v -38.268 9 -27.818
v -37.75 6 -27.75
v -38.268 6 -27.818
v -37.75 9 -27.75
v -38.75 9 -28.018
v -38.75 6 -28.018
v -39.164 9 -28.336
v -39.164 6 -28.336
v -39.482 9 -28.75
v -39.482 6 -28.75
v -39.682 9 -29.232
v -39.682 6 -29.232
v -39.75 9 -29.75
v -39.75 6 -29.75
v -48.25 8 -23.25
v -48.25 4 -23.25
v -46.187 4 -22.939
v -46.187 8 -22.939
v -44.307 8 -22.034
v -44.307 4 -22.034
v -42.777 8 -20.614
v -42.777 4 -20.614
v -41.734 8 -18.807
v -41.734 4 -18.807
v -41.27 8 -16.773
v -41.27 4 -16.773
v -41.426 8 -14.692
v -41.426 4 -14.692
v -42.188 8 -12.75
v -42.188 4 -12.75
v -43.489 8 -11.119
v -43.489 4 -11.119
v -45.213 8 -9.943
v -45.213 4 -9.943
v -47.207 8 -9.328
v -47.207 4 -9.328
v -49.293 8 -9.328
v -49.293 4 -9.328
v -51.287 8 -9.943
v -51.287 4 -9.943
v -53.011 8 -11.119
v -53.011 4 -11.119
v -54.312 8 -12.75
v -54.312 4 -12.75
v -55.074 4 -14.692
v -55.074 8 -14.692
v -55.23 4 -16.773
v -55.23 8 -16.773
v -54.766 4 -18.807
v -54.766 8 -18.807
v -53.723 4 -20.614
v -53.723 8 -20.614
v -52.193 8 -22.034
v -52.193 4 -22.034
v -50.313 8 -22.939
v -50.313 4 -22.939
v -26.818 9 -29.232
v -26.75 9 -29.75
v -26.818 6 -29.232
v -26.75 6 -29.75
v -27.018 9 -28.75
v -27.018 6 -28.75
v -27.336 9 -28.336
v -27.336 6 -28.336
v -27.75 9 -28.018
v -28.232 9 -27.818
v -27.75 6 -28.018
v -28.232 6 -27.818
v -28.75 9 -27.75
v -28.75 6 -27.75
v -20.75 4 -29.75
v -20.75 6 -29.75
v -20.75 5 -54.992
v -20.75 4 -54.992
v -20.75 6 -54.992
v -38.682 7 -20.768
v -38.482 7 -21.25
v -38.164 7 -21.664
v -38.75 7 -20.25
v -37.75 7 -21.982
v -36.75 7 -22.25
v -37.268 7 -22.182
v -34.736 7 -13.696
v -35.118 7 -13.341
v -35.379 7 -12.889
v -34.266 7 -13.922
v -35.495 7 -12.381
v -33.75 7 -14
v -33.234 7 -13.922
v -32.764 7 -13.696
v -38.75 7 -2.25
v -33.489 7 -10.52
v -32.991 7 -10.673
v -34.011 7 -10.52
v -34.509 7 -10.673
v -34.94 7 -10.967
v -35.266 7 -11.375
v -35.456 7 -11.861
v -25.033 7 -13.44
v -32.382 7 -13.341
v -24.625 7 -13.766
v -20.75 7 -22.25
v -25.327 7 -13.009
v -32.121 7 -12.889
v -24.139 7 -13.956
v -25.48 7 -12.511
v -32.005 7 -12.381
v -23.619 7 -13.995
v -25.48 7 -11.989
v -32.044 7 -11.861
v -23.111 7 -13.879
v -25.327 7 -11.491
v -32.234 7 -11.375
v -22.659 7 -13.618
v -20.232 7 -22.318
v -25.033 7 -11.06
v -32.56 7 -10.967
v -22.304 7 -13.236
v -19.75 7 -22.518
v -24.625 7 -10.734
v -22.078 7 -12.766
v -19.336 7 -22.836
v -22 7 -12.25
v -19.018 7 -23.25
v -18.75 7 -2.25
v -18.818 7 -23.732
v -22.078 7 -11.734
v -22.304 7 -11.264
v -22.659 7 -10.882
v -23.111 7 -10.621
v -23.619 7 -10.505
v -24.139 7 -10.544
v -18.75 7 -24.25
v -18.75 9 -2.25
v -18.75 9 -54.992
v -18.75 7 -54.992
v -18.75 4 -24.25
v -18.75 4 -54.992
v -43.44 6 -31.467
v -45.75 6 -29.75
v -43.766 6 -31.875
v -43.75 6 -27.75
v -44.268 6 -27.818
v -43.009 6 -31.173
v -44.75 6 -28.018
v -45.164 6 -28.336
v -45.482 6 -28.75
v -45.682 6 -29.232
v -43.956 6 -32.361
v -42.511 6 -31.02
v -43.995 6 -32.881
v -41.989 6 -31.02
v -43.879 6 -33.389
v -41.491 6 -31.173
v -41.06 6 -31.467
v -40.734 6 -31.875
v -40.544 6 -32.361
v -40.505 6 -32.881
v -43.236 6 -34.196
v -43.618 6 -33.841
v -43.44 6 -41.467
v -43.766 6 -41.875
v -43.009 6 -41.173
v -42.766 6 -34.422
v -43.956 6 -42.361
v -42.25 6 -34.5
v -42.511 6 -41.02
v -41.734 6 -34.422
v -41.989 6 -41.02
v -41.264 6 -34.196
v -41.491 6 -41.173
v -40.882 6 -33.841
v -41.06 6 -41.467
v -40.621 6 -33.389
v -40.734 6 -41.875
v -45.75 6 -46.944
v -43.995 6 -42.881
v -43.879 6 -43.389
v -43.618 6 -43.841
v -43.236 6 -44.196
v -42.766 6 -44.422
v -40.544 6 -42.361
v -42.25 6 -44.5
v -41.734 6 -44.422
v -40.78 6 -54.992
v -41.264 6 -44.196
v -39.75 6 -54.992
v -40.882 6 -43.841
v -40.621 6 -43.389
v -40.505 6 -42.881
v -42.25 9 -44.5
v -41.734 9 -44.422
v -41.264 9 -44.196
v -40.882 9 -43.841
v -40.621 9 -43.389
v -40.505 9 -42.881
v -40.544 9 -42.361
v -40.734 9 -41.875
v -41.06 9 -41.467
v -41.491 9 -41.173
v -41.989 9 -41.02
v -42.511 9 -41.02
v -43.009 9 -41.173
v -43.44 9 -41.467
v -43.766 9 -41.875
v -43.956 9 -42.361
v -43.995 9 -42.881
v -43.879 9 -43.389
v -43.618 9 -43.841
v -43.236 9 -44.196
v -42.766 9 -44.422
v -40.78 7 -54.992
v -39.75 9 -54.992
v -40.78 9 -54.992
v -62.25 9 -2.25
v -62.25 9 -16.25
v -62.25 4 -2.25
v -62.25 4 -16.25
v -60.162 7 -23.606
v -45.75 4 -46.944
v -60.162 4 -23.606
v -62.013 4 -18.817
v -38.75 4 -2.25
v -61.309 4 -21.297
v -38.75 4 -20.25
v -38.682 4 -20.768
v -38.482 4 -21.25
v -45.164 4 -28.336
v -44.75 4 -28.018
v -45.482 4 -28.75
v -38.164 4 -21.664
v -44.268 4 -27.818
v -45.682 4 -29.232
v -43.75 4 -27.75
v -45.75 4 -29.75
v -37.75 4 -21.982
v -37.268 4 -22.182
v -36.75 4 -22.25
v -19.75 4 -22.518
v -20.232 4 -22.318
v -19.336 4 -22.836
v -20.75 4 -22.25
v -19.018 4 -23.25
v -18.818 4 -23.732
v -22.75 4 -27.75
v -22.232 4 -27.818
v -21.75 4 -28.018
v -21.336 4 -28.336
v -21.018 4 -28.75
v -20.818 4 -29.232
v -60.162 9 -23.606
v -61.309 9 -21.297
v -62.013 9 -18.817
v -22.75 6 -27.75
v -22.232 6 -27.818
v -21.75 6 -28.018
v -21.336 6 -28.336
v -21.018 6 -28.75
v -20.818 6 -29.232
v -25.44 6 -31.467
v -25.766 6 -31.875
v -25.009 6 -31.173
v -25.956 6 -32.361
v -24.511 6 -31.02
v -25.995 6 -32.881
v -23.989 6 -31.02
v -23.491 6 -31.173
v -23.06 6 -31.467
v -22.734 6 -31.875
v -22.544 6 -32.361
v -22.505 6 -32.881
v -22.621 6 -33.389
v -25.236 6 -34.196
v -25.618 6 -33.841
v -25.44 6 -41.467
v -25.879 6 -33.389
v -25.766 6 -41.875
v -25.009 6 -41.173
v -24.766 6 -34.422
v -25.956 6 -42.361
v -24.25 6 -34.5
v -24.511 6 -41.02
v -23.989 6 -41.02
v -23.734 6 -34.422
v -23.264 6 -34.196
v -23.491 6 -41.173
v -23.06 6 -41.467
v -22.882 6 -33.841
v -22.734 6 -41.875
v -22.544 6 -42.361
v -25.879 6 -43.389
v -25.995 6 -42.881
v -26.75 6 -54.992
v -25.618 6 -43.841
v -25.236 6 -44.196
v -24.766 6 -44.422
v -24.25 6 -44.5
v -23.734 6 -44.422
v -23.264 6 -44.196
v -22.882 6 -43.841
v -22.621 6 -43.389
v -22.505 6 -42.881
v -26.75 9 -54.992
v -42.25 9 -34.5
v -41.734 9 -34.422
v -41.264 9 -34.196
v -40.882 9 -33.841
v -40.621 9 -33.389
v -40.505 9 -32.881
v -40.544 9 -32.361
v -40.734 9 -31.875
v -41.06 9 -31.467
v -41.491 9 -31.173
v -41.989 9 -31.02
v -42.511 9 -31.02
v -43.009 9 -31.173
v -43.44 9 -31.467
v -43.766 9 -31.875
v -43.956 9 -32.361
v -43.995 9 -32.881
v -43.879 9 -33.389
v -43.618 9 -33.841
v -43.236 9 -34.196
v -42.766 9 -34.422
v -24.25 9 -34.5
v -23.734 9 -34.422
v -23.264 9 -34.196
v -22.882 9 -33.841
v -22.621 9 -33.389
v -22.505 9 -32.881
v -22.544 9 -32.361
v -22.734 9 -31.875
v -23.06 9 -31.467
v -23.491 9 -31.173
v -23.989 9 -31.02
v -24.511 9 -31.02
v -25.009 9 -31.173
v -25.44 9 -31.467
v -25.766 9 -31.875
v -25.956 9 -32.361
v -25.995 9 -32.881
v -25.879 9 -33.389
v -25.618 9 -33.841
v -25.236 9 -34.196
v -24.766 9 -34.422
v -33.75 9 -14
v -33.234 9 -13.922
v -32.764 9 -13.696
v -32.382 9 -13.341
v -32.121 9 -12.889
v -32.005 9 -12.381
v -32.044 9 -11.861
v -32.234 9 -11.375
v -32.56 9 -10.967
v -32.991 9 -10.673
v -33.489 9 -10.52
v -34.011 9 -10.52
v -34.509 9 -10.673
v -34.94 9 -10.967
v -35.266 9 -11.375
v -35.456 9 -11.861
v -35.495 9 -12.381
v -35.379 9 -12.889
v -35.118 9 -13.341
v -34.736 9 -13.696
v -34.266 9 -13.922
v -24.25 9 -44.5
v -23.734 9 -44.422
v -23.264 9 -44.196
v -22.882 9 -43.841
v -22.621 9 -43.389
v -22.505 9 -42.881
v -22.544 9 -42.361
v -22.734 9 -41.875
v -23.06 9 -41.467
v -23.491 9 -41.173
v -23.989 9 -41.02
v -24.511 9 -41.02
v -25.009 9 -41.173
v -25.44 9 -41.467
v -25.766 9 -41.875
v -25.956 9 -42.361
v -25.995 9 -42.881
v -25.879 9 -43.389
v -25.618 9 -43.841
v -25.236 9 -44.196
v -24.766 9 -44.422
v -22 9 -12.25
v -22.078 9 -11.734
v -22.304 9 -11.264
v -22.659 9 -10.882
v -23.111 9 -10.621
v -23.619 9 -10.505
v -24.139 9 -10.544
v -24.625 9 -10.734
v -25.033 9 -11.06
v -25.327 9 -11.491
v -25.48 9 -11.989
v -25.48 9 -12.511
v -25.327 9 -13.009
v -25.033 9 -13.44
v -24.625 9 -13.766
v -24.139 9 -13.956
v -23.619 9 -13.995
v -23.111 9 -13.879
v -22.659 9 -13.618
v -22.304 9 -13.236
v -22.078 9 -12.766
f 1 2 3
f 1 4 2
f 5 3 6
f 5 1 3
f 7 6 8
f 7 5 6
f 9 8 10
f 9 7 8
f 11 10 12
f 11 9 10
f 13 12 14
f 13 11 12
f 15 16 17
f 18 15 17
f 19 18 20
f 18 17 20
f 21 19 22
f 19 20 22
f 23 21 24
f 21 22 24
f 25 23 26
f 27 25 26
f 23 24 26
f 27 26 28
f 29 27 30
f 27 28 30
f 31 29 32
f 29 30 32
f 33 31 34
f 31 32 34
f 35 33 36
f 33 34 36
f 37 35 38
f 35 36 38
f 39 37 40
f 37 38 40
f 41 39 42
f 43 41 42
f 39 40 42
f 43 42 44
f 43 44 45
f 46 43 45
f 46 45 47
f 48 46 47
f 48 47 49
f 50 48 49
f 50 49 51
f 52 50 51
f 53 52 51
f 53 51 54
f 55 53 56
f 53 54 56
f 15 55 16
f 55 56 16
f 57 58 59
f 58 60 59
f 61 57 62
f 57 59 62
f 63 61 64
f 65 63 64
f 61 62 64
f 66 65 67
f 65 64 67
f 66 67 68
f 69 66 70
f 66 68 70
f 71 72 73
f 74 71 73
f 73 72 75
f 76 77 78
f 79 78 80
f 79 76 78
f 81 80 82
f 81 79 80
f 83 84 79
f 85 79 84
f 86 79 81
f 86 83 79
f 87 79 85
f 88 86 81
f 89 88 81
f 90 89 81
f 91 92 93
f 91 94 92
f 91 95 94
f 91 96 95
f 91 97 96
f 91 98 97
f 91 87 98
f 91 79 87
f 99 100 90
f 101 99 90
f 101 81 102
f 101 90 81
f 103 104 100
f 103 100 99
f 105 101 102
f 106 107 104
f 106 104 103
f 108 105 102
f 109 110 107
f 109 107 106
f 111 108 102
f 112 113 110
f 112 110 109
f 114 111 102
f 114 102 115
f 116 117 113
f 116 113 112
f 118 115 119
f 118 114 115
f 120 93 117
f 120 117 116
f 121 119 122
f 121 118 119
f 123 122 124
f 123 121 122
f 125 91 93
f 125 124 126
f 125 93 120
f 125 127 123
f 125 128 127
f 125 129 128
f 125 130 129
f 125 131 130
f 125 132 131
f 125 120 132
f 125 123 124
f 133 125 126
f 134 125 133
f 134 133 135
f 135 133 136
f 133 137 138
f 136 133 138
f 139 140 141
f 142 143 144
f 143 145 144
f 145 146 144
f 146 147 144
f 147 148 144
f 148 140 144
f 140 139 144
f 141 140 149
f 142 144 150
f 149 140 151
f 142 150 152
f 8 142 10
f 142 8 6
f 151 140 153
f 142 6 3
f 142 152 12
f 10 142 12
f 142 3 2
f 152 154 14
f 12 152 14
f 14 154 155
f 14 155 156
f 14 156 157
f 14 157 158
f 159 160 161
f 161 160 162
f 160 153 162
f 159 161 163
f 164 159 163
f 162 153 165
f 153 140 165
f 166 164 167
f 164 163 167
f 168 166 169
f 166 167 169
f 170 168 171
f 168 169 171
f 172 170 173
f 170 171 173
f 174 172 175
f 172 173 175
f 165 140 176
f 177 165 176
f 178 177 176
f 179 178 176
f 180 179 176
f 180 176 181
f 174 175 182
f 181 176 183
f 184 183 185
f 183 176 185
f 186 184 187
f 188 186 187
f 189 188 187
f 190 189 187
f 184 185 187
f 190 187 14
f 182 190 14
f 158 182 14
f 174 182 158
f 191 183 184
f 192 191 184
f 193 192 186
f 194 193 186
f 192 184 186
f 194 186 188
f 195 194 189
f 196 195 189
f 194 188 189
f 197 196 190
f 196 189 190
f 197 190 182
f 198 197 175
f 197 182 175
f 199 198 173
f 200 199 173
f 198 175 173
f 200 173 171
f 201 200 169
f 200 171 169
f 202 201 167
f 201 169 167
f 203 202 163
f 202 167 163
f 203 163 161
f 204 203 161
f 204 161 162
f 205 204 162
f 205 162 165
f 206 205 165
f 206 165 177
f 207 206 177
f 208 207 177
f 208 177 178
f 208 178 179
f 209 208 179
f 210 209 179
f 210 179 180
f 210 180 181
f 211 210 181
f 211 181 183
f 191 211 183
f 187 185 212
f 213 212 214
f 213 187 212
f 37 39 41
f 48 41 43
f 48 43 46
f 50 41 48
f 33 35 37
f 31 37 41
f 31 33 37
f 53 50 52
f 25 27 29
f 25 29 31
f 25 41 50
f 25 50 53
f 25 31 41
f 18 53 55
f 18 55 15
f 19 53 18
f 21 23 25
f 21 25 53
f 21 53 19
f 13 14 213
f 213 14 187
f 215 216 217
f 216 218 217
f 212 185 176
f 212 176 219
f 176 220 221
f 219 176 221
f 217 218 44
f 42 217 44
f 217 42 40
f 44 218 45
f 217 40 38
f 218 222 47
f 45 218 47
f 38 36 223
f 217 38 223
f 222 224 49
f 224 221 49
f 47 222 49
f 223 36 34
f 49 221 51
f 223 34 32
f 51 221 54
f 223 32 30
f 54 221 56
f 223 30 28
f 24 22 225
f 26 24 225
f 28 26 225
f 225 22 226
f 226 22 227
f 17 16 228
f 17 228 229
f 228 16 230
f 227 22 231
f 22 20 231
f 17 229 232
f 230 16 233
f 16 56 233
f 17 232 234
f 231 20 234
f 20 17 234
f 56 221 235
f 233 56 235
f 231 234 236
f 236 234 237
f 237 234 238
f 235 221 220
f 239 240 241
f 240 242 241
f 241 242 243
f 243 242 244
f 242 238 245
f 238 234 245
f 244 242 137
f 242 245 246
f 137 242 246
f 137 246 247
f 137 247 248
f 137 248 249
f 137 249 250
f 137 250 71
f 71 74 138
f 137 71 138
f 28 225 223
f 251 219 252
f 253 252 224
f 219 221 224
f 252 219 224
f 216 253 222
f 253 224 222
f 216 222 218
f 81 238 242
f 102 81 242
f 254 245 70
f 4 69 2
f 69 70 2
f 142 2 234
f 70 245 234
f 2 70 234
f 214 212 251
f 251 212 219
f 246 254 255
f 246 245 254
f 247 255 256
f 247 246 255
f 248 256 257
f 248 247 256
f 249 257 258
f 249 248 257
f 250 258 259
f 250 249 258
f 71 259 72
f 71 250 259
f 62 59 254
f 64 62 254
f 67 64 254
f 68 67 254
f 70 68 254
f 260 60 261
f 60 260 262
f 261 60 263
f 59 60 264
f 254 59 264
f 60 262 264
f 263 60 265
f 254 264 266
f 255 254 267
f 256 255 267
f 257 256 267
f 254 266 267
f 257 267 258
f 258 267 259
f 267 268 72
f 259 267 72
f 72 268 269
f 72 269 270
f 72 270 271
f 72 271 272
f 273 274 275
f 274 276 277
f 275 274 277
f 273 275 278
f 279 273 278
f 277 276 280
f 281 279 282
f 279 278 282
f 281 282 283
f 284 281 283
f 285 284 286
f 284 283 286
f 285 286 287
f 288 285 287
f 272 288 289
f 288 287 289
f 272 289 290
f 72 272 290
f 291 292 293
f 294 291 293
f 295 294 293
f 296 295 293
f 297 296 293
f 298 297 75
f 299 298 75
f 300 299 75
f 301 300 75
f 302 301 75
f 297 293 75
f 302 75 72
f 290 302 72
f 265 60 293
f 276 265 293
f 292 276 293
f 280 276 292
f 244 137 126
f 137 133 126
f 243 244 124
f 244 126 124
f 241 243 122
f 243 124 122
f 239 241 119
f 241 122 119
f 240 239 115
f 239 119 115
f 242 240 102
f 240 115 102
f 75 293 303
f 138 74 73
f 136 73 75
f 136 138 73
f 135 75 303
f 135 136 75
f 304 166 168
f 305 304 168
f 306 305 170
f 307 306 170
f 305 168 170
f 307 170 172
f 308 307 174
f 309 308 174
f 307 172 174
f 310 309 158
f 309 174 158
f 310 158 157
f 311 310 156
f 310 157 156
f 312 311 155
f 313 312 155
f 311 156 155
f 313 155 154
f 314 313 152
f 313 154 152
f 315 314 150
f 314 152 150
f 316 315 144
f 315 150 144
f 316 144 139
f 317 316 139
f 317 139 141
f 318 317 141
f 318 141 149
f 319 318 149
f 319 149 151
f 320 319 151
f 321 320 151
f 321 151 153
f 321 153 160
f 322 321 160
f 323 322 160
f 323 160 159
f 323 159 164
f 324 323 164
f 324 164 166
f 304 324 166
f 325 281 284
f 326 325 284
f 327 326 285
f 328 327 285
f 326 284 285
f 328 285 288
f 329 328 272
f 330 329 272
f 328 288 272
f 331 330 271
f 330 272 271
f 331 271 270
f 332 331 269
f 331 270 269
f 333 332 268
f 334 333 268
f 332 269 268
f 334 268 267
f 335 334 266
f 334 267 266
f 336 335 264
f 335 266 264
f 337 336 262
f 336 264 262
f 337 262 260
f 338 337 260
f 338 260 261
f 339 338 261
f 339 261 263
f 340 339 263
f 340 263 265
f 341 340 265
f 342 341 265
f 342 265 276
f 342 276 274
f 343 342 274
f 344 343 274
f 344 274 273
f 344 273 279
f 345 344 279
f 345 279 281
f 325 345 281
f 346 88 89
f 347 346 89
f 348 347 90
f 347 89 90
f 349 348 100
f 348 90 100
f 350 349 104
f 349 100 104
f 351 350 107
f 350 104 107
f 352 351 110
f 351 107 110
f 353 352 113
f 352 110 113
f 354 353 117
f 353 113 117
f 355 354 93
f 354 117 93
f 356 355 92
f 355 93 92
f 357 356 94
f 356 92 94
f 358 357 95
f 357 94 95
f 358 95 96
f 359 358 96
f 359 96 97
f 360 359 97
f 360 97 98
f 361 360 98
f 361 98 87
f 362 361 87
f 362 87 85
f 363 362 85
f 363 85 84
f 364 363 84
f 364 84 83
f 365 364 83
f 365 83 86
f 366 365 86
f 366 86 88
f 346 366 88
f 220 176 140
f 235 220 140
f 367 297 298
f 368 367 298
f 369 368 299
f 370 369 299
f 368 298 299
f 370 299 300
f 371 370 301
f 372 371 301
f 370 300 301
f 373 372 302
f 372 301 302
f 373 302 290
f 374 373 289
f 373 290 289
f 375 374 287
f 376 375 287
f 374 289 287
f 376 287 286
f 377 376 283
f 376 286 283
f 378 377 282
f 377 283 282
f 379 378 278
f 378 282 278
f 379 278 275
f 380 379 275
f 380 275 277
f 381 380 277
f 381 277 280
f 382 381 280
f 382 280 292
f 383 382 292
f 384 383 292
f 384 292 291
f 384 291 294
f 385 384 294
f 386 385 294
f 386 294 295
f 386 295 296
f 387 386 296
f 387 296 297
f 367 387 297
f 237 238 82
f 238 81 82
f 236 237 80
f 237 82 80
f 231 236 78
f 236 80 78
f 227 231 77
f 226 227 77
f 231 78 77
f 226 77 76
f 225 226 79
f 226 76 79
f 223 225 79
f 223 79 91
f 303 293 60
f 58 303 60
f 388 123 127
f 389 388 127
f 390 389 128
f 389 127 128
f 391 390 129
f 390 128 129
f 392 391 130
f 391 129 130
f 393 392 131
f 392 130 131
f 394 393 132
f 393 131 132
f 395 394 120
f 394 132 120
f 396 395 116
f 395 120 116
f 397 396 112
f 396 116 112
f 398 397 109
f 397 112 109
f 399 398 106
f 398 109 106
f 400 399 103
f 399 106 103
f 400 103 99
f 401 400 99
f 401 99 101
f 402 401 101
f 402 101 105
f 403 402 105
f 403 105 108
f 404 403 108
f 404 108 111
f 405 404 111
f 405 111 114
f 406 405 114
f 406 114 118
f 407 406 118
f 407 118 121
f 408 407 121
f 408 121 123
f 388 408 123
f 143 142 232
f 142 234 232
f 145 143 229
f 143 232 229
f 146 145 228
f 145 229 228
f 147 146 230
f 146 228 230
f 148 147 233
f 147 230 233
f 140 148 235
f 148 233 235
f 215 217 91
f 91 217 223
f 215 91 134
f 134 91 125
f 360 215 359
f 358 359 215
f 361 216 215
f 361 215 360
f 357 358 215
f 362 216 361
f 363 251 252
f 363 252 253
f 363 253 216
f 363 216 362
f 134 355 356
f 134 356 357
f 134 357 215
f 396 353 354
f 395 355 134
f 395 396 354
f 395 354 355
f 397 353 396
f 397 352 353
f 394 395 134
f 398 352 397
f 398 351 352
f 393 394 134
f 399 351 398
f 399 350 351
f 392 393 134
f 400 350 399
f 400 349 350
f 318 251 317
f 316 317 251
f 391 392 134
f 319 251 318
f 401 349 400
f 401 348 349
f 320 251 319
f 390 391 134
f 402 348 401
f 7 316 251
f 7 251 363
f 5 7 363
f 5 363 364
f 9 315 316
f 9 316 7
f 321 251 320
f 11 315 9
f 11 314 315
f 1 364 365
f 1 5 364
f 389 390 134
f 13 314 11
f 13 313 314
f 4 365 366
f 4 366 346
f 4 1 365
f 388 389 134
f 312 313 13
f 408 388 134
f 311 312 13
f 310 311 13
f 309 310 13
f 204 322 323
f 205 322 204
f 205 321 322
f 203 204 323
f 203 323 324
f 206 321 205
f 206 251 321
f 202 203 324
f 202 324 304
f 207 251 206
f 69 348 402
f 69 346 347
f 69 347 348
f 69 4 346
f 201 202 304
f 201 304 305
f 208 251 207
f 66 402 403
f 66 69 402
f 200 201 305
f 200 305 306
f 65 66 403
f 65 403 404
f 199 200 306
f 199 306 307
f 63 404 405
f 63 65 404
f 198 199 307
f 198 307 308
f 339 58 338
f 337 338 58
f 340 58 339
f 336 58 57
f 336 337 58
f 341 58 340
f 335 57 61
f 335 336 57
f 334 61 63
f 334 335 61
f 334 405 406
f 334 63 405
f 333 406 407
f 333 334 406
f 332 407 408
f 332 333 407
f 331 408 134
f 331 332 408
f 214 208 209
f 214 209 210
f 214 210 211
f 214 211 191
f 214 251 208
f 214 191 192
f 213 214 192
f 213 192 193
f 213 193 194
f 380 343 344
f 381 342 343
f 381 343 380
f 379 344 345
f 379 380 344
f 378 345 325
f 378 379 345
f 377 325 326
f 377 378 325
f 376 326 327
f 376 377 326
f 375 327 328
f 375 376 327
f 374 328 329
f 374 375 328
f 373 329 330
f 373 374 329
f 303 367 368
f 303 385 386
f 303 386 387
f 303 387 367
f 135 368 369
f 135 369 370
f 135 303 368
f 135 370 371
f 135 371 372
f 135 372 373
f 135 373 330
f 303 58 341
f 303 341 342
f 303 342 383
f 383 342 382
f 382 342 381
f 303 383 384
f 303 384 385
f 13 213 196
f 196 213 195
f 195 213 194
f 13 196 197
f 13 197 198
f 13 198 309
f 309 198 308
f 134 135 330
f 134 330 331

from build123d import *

# Parameters (mm, degrees)
SKETCH_1_W                = 35
SKETCH_1_H                = 55
EXTRUDE_1_DEPTH           = 1
EXTRUDE_2_DEPTH           = 3
SKETCH_3_R                = 5
CUT_EXTRUDE_1_DEPTH       = 169.569903897
SKETCH_4_R                = 4
CUT_EXTRUDE_2_DEPTH       = 2
SKETCH_5_R                = 2
CUT_EXTRUDE_3_DEPTH       = 2
EXTRUDE_START             = 7
EXTRUDE_3_DEPTH           = 7
CUT_EXTRUDE_START         = -1.5
SKETCH_9_W                = 10
SKETCH_9_H                = 26
CUT_EXTRUDE_4_DEPTH       = 168.318874833
SKETCH_10_R               = 1.5
CUT_EXTRUDE_5_DEPTH       = 194.595583627
EXTRUDE_4_DEPTH           = 3
SKETCH_13_W               = 334.012533363
SKETCH_13_H               = 161.456209481
CUT_EXTRUDE_6_DEPTH       = 10
SKETCH_14_R               = 3.5
CUT_EXTRUDE_7_DEPTH       = 2.5
SKETCH_15_R               = 5
CUT_EXTRUDE_8_DEPTH       = 179.854165453
EXTRUDE_START_2           = 16
EXTRUDE_5_DEPTH           = 16
EXTRUDE_6_DEPTH           = 7
SKETCH_19_W               = 10
SKETCH_19_H               = 26
CUT_EXTRUDE_9_DEPTH       = 180.209193181
SKETCH_20_R               = 1.5
CUT_EXTRUDE_10_DEPTH      = 175.844216376
THREAD_1_PITCH            = 0.6
CUT_EXTRUDE_11_DEPTH      = 181.709193232
SKETCH_22_W               = 13
SKETCH_22_H               = 1.5
CUT_EXTRUDE_12_DEPTH      = 7
SKETCH_23_R               = 5
EXTRUDE_7_DEPTH           = 2
CUT_EXTRUDE_START_2       = -3
CUT_EXTRUDE_15_DEPTH      = 177.762490825
SKETCH_25_R               = 7
CUT_EXTRUDE_16_DEPTH      = 4
CUT_EXTRUDE_17_DEPTH      = 10
SKETCH_27_R               = 1.75
CUT_EXTRUDE_18_DEPTH      = 10
CUT_EXTRUDE_19_DEPTH      = 180.762490825
CUT_EXTRUDE_19_DEPTH_BACK = 60
CUT_EXTRUDE_20_DEPTH      = 2
SKETCH_30_W               = 11.653427307
SKETCH_30_H               = 7.287785495
CUT_EXTRUDE_21_DEPTH      = 193.522031886
SKETCH_31_W               = 3.751946438
SKETCH_31_H               = 6.76496914
CUT_EXTRUDE_22_DEPTH      = 10
SKETCH_32_R               = 1
CUT_EXTRUDE_23_DEPTH      = 10
SKETCH_33_R               = 6.599468503
EXTRUDE_8_DEPTH           = 1
SKETCH_35_W               = 76.825944062
SKETCH_35_H               = 20.911958218
CUT_EXTRUDE_24_DEPTH      = 193.102403623
SKETCH_36_W               = 20
SKETCH_36_H               = 20
CUT_EXTRUDE_25_DEPTH      = 3
SKETCH_37_R               = 1.75
CUT_EXTRUDE_26_DEPTH      = 10
FILLET_1_R                = 2


with BuildPart() as part:
    # Sketch 1 → 凸台-拉伸1 (new body)
    with BuildSketch(Plane(origin=(0, 0, 0), x_dir=(1, 0, 0), z_dir=(0, 1, 0))):
        Rectangle(SKETCH_1_W, SKETCH_1_H)
    extrude(amount=EXTRUDE_1_DEPTH)

    # 草图2 → 凸台-拉伸2 (add)
    with BuildSketch(Plane(origin=(0, 1, 0), x_dir=(1, 0, 0), z_dir=(0, 1, 0))):
        with BuildLine():
            Line((106.75, -2.25), (106.75, 2.25))
            Line((106.75, 2.25), (121.75, 2.25))
            ThreePointArc((121.75, 2.25), (122.922125199, 2.352547667), (124.058635967, 2.65707481))
            Line((124.058635967, 2.65707481), (154.058635967, 13.576181838))
            ThreePointArc((154.058635967, 13.576181838), (158.397452333, 21.091232227), (151.75, 26.669107028))
            Line((151.75, 26.669107028), (-31.447415548, 57.101298968))
            ThreePointArc((-31.447415548, 57.101298968), (-37.800418235, 56.264673928), (-42.609265279, 52.029632639))
            Line((-42.609265279, 52.029632639), (-60.161792173, 23.605896086))
            ThreePointArc((-60.161792173, 23.605896086), (-61.717833724, 20.073278016), (-62.25, 16.25))
            Line((-62.25, 16.25), (-62.25, -16.25))
            ThreePointArc((-62.25, -16.25), (-61.717833724, -20.073278016), (-60.161792173, -23.605896086))
            Line((-60.161792173, -23.605896086), (-42.609265279, -52.029632639))
            ThreePointArc((-42.609265279, -52.029632639), (-37.800418235, -56.264673928), (-31.447415548, -57.101298968))
            Line((-31.447415548, -57.101298968), (151.75, -26.669107028))
            ThreePointArc((151.75, -26.669107028), (158.397452333, -21.091232227), (154.058635967, -13.576181838))
            Line((154.058635967, -13.576181838), (124.058635967, -2.65707481))
            ThreePointArc((124.058635967, -2.65707481), (122.922125199, -2.352547667), (121.75, -2.25))
            Line((121.75, -2.25), (106.75, -2.25))
        make_face()
    extrude(amount=EXTRUDE_2_DEPTH)

    # 草图3 → 切除-拉伸1 (cut, through all)
    with BuildSketch(Plane(origin=(0, 4, 0), x_dir=(1, 0, 0), z_dir=(0, 1, 0))):
        with Locations(Location((-48.25, 16.25, 0), (0, 0, 270))):
            Circle(SKETCH_3_R)
        with Locations(Location((-48.25, -16.25, 0), (0, 0, 270))):
            Circle(SKETCH_3_R)
    extrude(amount=-CUT_EXTRUDE_1_DEPTH, mode=Mode.SUBTRACT)

    # 草图4 → 切除-拉伸2 (cut)
    with BuildSketch(Plane(origin=(0, 4, 0), x_dir=(1, 0, 0), z_dir=(0, 1, 0))):
        with Locations(Location((-33.25, 46.25, 0), (0, 0, 270))):
            Circle(SKETCH_4_R)
        with Locations(Location((-33.25, -46.25, 0), (0, 0, 270))):
            Circle(SKETCH_4_R)
    extrude(amount=-CUT_EXTRUDE_2_DEPTH, mode=Mode.SUBTRACT)

    # 草图5 → 切除-拉伸3 (cut)
    with BuildSketch(Plane(origin=(0, 4, 0), x_dir=(1, 0, 0), z_dir=(0, 1, 0))):
        with Locations(Location((121.75, 9, 0), (0, 0, 270))):
            Circle(SKETCH_5_R)
        with Locations(Location((121.75, -9, 0), (0, 0, 270))):
            Circle(SKETCH_5_R)
        with Locations(Location((151.75, 19.919107028, 0), (0, 0, 270))):
            Circle(SKETCH_5_R)
        with Locations(Location((151.75, -19.919107028, 0), (0, 0, 270))):
            Circle(SKETCH_5_R)
    extrude(amount=-CUT_EXTRUDE_3_DEPTH, mode=Mode.SUBTRACT)

    # 草图8 → 凸台-拉伸3 (add)
    with BuildSketch(Plane.XZ.offset(-1).offset(EXTRUDE_START)):
        with BuildLine():
            Line((-26.75, -26.25), (-39.75, -26.25))
            Line((-39.75, -26.25), (-39.75, -55.124119675))
            ThreePointArc((-39.75, -55.124119675), (-35.798281322, -56.950759894), (-31.447415548, -57.101298968))
            Line((-31.447415548, -57.101298968), (-26.75, -56.320978726))
            Line((-26.75, -56.320978726), (-26.75, -26.25))
        make_face()
    extrude_3 = extrude(amount=-EXTRUDE_3_DEPTH)

    # 镜向1: 凸台-拉伸3 across plane
    add(extrude_3.mirror(Plane.XY))

    # 草图9 → 切除-拉伸4 (cut, through all)
    with BuildSketch(Plane.XZ.offset(6).offset(CUT_EXTRUDE_START)):
        with Locations((-33.25, -40.75)):
            Rectangle(SKETCH_9_W, SKETCH_9_H)
    cut_extrude_4 = extrude(amount=-CUT_EXTRUDE_4_DEPTH, mode=Mode.SUBTRACT)

    # 镜向2: 切除-拉伸4 across plane
    add(cut_extrude_4.mirror(Plane.XY), mode=Mode.SUBTRACT)

    # 草图10 → 切除-拉伸5 (cut, through all)
    with BuildSketch(Plane.XY.offset(-53.75)):
        with Locations((-33.25, -1.5)):
            Circle(SKETCH_10_R)
    cut_extrude_5 = extrude(amount=-CUT_EXTRUDE_5_DEPTH, mode=Mode.SUBTRACT)

    # 镜向3: 切除-拉伸5 across plane
    add(cut_extrude_5.mirror(Plane.XY), mode=Mode.SUBTRACT)

    # 草图12 → 凸台-拉伸4 (add)
    with BuildSketch(Plane(origin=(0, 4, 0), x_dir=(1, 0, 0), z_dir=(0, 1, 0))):
        with BuildLine():
            Line((152.536154407, 34.648141662), (-30.136445037, 64.993152763))
            ThreePointArc((-30.136445037, 64.993152763), (-32.296727103, 65.226071005), (-34.469475839, 65.210824842))
            Line((-34.469475839, 65.210824842), (-60.161792173, 23.605896086))
            ThreePointArc((-60.161792173, 23.605896086), (-61.717833724, 20.073278016), (-62.25, 16.25))
            Line((-62.25, 16.25), (-62.25, 2.25))
            Line((-62.25, 2.25), (121.75, 2.25))
            ThreePointArc((121.75, 2.25), (122.922125199, 2.352547667), (124.058635967, 2.65707481))
            Line((124.058635967, 2.65707481), (166.382589153, 18.061733966))
            ThreePointArc((166.382589153, 18.061733966), (163.073058037, 29.371665237), (152.536154407, 34.648141662))
        make_face()
    extrude(amount=EXTRUDE_4_DEPTH)

    # 草图13 → 切除-拉伸6 (cut)
    with BuildSketch(Plane.XZ.offset(-4)):
        with Locations((47.836319436, 6.16656882)):
            Rectangle(SKETCH_13_W, SKETCH_13_H)
    extrude(amount=CUT_EXTRUDE_6_DEPTH, mode=Mode.SUBTRACT)

    # 草图14 → 切除-拉伸7 (cut)
    with BuildSketch(Plane.XZ.offset(-4)):
        with Locations(Location((151.75, -19.919107028, 0), (0, 0, 270))):
            Circle(SKETCH_14_R)
        with Locations(Location((121.75, -9, 0), (0, 0, 270))):
            Circle(SKETCH_14_R)
    extrude(amount=-CUT_EXTRUDE_7_DEPTH, mode=Mode.SUBTRACT)

    # 草图15 → 切除-拉伸8 (cut, through all)
    with BuildSketch(Plane.XZ.offset(-4)):
        with Locations(Location((-48.25, -16.25, 0), (0, 0, 270))):
            Circle(SKETCH_15_R)
    extrude(amount=-CUT_EXTRUDE_8_DEPTH, mode=Mode.SUBTRACT)

    # 草图17 → 凸台-拉伸5 (add)
    with BuildSketch(Plane.XZ.offset(-4).offset(EXTRUDE_START_2)):
        with BuildLine():
            Line((-30.628058978, -62.03370759), (152.218782473, -31.659751942))
            ThreePointArc((152.218782473, -31.659751942), (161.216553887, -26.879484712), (163.096310198, -16.865626245))
            Line((163.096310198, -16.865626245), (166.382589153, -18.061733966))
            ThreePointArc((166.382589153, -18.061733966), (163.073058037, -29.371665237), (152.536154407, -34.648141662))
            Line((152.536154407, -34.648141662), (-30.136445037, -64.993152763))
            ThreePointArc((-30.136445037, -64.993152763), (-32.296727103, -65.226071005), (-34.469475839, -65.210824842))
            Line((-34.469475839, -65.210824842), (-36.504423199, -61.915526791))
            ThreePointArc((-36.504423199, -61.915526791), (-33.571714316, -62.246765295), (-30.628058978, -62.03370759))
        make_face()
    extrude(amount=-EXTRUDE_5_DEPTH)

    # 草图18 → 凸台-拉伸6 (add)
    with BuildSketch(Plane(origin=(0, 7, 0), x_dir=(1, 0, 0), z_dir=(0, 1, 0))):
        with BuildLine():
            Line((-39.75, 56.65979236), (-39.75, 26.25))
            Line((-39.75, 26.25), (-26.75, 26.25))
            Line((-26.75, 26.25), (-26.75, 64.430606916))
            Line((-26.75, 64.430606916), (-30.136445037, 64.993152763))
            ThreePointArc((-30.136445037, 64.993152763), (-32.296727103, 65.226071005), (-34.469475839, 65.210824842))
            Line((-34.469475839, 65.210824842), (-39.75, 56.65979236))
        make_face()
    extrude(amount=EXTRUDE_6_DEPTH)

    # 草图19 → 切除-拉伸9 (cut, through all)
    with BuildSketch(Plane(origin=(0, 14, 0), x_dir=(1, 0, 0), z_dir=(0, 1, 0)).offset(CUT_EXTRUDE_START)):
        with Locations((-33.25, 40.75)):
            Rectangle(SKETCH_19_W, SKETCH_19_H)
    extrude(amount=-CUT_EXTRUDE_9_DEPTH, mode=Mode.SUBTRACT)

    # 草图20 → 切除-拉伸10 (cut, through all)
    with BuildSketch(Plane.XY.offset(-53.75)):
        with Locations((-33.25, 9.5)):
            Circle(SKETCH_20_R)
    extrude(amount=-CUT_EXTRUDE_10_DEPTH, mode=Mode.SUBTRACT)

    # 螺纹线1: the profile of Sketch 1 2 profile screwed along a right-hand helix of 25 turns, 6 arcs to a turn; built about Z, then put on its axis
    thread_1_z = Axis((0, 0, 0), (0, 0, 1))
    thread_1_corners = [(1.4997, 0, -0.000173205), (1.824759525, 0, 0.187499999), (1.824759525, 0, 0.262499999), (1.4997, 0, 0.450173203)]
    with BuildLine(mode=Mode.PRIVATE) as thread_1_profile:
        Line(thread_1_corners[0], thread_1_corners[1])
        Line(thread_1_corners[1], thread_1_corners[2])
        Line(thread_1_corners[2], thread_1_corners[3])
        Line(thread_1_corners[3], thread_1_corners[0])
    thread_1_cap = Face(thread_1_profile.wire())
    thread_1_turn_angles = [0, 30, 60, 90, 120, 150, 180, 210, 240, 270, 300, 330, 360]
    thread_1_turn_weights = [1, 0.8660254037844387, 1, 0.8660254037844387, 1, 0.8660254037844387, 1, 0.8660254037844387, 1, 0.8660254037844387, 1, 0.8660254037844387, 1]
    thread_1_turn_rails = [Edge.make_bspline([Vector(p[0], p[1], 0).rotate(thread_1_z, thread_1_turn_angles[k]) / thread_1_turn_weights[k] + Vector(0, 0, p[2] + THREAD_1_PITCH * thread_1_turn_angles[k] / 360) for k in range(13)], [0, 0, 0, 1, 1, 2, 2, 3, 3, 4, 4, 5, 5, 6, 6, 6], 2, thread_1_turn_weights) for p in thread_1_corners]
    thread_1_turn_sides = [Face.make_surface_from_curves(thread_1_turn_rails[p[0]], thread_1_turn_rails[p[1]]) for p in [(0, 1), (1, 2), (2, 3), (3, 0)]]
    thread_1 = Plane(origin=(-33.25, 9.5, -53.75), x_dir=(-1, 0, 0), z_dir=(0, 0, -1)) * Solid(Shell([*[p.moved(Location((0, 0, THREAD_1_PITCH * i))) for i in range(25) for p in thread_1_turn_sides], thread_1_cap, thread_1_cap.rotate(thread_1_z, 9000).moved(Location((0, 0, THREAD_1_PITCH * 9000 / 360)))]))
    add(thread_1, mode=Mode.SUBTRACT)

    # 草图21 → 切除-拉伸11 (cut, through all)
    with BuildSketch(Plane(origin=(0, 14, 0), x_dir=(1, 0, 0), z_dir=(0, 1, 0))):
        with BuildLine():
            Line((-39.75, 27.75), (-26.75, 27.75))
            Line((-26.75, 27.75), (-26.75, 64.430606916))
            Line((-26.75, 64.430606916), (-30.136445037, 64.993152763))
            ThreePointArc((-30.136445037, 64.993152763), (-32.296727103, 65.226071005), (-34.469475839, 65.210824842))
            Line((-34.469475839, 65.210824842), (-39.75, 56.65979236))
            Line((-39.75, 56.65979236), (-39.75, 27.75))
        make_face()
    extrude(amount=-CUT_EXTRUDE_11_DEPTH, mode=Mode.SUBTRACT)

    # 草图22 → 切除-拉伸12 (cut)
    with BuildSketch(Plane(origin=(0, 14, 0), x_dir=(1, 0, 0), z_dir=(0, 1, 0))):
        with Locations((-33.25, 27)):
            Rectangle(SKETCH_22_W, SKETCH_22_H)
    extrude(amount=-CUT_EXTRUDE_12_DEPTH, mode=Mode.SUBTRACT)

    # 草图23 → 凸台-拉伸7 (add)
    with BuildSketch(Plane(origin=(0, 7, 0), x_dir=(1, 0, 0), z_dir=(0, 1, 0))):
        with BuildLine():
            Line((-26.75, 27.75), (-39.75, 27.75))
            Line((-39.75, 27.75), (-39.75, 56.65979236))
            Line((-39.75, 56.65979236), (-60.161792173, 23.605896086))
            ThreePointArc((-60.161792173, 23.605896086), (-61.717833724, 20.073278016), (-62.25, 16.25))
            Line((-62.25, 16.25), (-62.25, 2.25))
            Line((-62.25, 2.25), (-18.75, 2.25))
            Line((-18.75, 2.25), (-18.75, 63.101671489))
            Line((-18.75, 63.101671489), (-26.75, 64.430606916))
            Line((-26.75, 64.430606916), (-26.75, 27.75))
        make_face()
        with Locations(Location((-48.25, 16.25, 0), (0, 0, 90))):
            Circle(SKETCH_23_R, mode=Mode.SUBTRACT)
    extrude(amount=EXTRUDE_7_DEPTH)

    # 草图24 → 切除-拉伸15 (cut, through all)
    with BuildSketch(Plane(origin=(0, 9, 0), x_dir=(1, 0, 0), z_dir=(0, 1, 0)).offset(CUT_EXTRUDE_START_2)):
        Polygon((-45.75, 46.034880297), (-45.75, 27.75), (-39.75, 27.75), (-39.75, 56.65979236), (-45.75, 46.943674541), align=None)
        Polygon((-26.75, 64.430606916), (-26.75, 27.75), (-20.75, 27.75), (-20.75, 63.433905346), align=None)
    extrude(amount=-CUT_EXTRUDE_15_DEPTH, mode=Mode.SUBTRACT)

    # 草图25 → 切除-拉伸16 (cut)
    with BuildSketch(Plane.XZ.offset(-4)):
        with Locations(Location((-48.25, -16.25, 0), (0, 0, 270))):
            Circle(SKETCH_25_R)
    extrude(amount=-CUT_EXTRUDE_16_DEPTH, mode=Mode.SUBTRACT)

    # 草图26 → 切除-拉伸17 (cut)
    with BuildSketch(Plane(origin=(0, 7, 0), x_dir=(1, 0, 0), z_dir=(0, 1, 0))):
        with BuildLine():
            Line((3.5, 31.25), (3.5, 35.25))
            ThreePointArc((3.5, 35.25), (1.75, 37), (0, 35.25))
            Line((0, 35.25), (0, 31.25))
            ThreePointArc((0, 31.25), (1.75, 29.5), (3.5, 31.25))
        make_face()
        with BuildLine():
            ThreePointArc((41.75, 18), (40.512563133, 17.487436867), (40, 16.25))
            Line((40, 16.25), (47.5, 16.25))
            ThreePointArc((47.5, 16.25), (46.987436867, 17.487436867), (45.75, 18))
            Line((45.75, 18), (41.75, 18))
        make_face()
        with BuildLine():
            Line((47.5, 16.25), (40, 16.25))
            ThreePointArc((40, 16.25), (40.512563133, 15.012563133), (41.75, 14.5))
            Line((41.75, 14.5), (45.75, 14.5))
            ThreePointArc((45.75, 14.5), (46.987436867, 15.012563133), (47.5, 16.25))
        make_face()
        with BuildLine():
            Line((81.75, 14.5), (85.75, 14.5))
            ThreePointArc((85.75, 14.5), (87.5, 16.25), (85.75, 18))
            Line((85.75, 18), (81.75, 18))
            ThreePointArc((81.75, 18), (80, 16.25), (81.75, 14.5))
        make_face()
        with BuildLine():
            Line((1.75, 18), (5.75, 18))
            ThreePointArc((5.75, 18), (7.5, 16.25), (5.75, 14.5))
            Line((5.75, 14.5), (1.75, 14.5))
            ThreePointArc((1.75, 14.5), (0, 16.25), (1.75, 18))
        make_face()
    extrude(amount=-CUT_EXTRUDE_17_DEPTH, mode=Mode.SUBTRACT)

    # 草图27 → 切除-拉伸18 (cut)
    with BuildSketch(Plane.XZ.offset(-6)):
        with Locations(Location((-42.25, -32.75, 0), (0, 0, 270))):
            Circle(SKETCH_27_R)
        with Locations(Location((-42.25, -42.75, 0), (0, 0, 270))):
            Circle(SKETCH_27_R)
        with Locations(Location((-24.25, -32.75, 0), (0, 0, 270))):
            Circle(SKETCH_27_R)
        with Locations(Location((-24.25, -42.75, 0), (0, 0, 270))):
            Circle(SKETCH_27_R)
    extrude(amount=-CUT_EXTRUDE_18_DEPTH, mode=Mode.SUBTRACT)

    # 草图28 → 切除-拉伸19 (cut, two sides: drawn at the far end of the back side and taken through both)
    with BuildSketch(Plane.XZ.offset(12).offset(-CUT_EXTRUDE_19_DEPTH_BACK)):
        with BuildLine():
            Line((152.218782473, -31.659751942), (-20.75, -60.392794775))
            Line((-20.75, -60.392794775), (-20.75, -63.433905346))
            Line((-20.75, -63.433905346), (152.536154407, -34.648141662))
            ThreePointArc((152.536154407, -34.648141662), (163.073058037, -29.371665237), (166.382589153, -18.061733966))
            Line((166.382589153, -18.061733966), (163.096310198, -16.865626245))
            ThreePointArc((163.096310198, -16.865626245), (161.216553887, -26.879484712), (152.218782473, -31.659751942))
        make_face()
        Polygon((-26.75, -61.389496345), (-26.75, -64.430606916), (-20.75, -63.433905346), (-20.75, -60.392794775), align=None)
    extrude(amount=CUT_EXTRUDE_19_DEPTH + CUT_EXTRUDE_19_DEPTH_BACK, mode=Mode.SUBTRACT)

    # 草图29 → 切除-拉伸20 (cut)
    with BuildSketch(Plane.XZ.offset(-4).offset(CUT_EXTRUDE_START_2)):
        with BuildLine():
            Line((-18.75, -60.060560918), (152.218782473, -31.659751942))
            ThreePointArc((152.218782473, -31.659751942), (161.216553887, -26.879484712), (163.096310198, -16.865626245))
            Line((163.096310198, -16.865626245), (154.058635967, -13.576181838))
            ThreePointArc((154.058635967, -13.576181838), (158.397452333, -21.091232227), (151.75, -26.669107028))
            Line((151.75, -26.669107028), (-18.75, -54.9920433))
            Line((-18.75, -54.9920433), (-18.75, -60.060560918))
        make_face()
    extrude(amount=CUT_EXTRUDE_20_DEPTH, mode=Mode.SUBTRACT)

    # 草图30 → 切除-拉伸21 (cut, through all)
    with BuildSketch(Plane(origin=(-18.75, 0, 0), x_dir=(0, 0, -1), z_dir=(1, 0, 0))):
        with Locations((60.818756954, 8.643892748)):
            Rectangle(SKETCH_30_W, SKETCH_30_H)
    extrude(amount=-CUT_EXTRUDE_21_DEPTH, mode=Mode.SUBTRACT)

    # 草图31 → 切除-拉伸22 (cut)
    with BuildSketch(Plane(origin=(0, 5, 0), x_dir=(1, 0, 0), z_dir=(0, 1, 0))):
        with Locations((-20.625973219, 58.37452787)):
            Rectangle(SKETCH_31_W, SKETCH_31_H)
    extrude(amount=-CUT_EXTRUDE_22_DEPTH, mode=Mode.SUBTRACT)

    # 草图32 → 切除-拉伸23 (cut)
    with BuildSketch(Plane(origin=(0, 5, 0), x_dir=(1, 0, 0), z_dir=(0, 1, 0))):
        with BuildLine():
            ThreePointArc((11.886282262, 52.603213934), (10.968496238, 53.599828635), (9.899800538, 52.767085248))
            Line((9.899800538, 52.767085248), (11.872763986, 52.43934262))
            ThreePointArc((11.872763986, 52.43934262), (11.882896963, 52.520999958), (11.886282262, 52.603213934))
        make_face()
        with BuildLine():
            Line((11.872763986, 52.43934262), (9.899800538, 52.767085248))
            ThreePointArc((9.899800538, 52.767085248), (10.722410948, 51.61673221), (11.872763986, 52.43934262))
        make_face()
        with BuildLine():
            ThreePointArc((51.345551236, 46.04836138), (50.427765212, 47.044976081), (49.359069512, 46.212232694))
            Line((49.359069512, 46.212232694), (51.332032961, 45.884490066))
            ThreePointArc((51.332032961, 45.884490066), (51.342165937, 45.966147404), (51.345551236, 46.04836138))
        make_face()
        with BuildLine():
            Line((51.332032961, 45.884490066), (49.359069512, 46.212232694))
            ThreePointArc((49.359069512, 46.212232694), (50.181679923, 45.061879655), (51.332032961, 45.884490066))
        make_face()
        with Locations(Location((89.804820211, 39.493508826, 0), (0, 0, 270))):
            Circle(SKETCH_32_R)
        with Locations(Location((129.264089185, 32.938656271, 0), (0, 0, 270))):
            Circle(SKETCH_32_R)
    extrude(amount=-CUT_EXTRUDE_23_DEPTH, mode=Mode.SUBTRACT)

    # 草图33 → 凸台-拉伸8 (add)
    with BuildSketch(Plane(origin=(0, 9, 0), x_dir=(1, 0, 0), z_dir=(0, 1, 0))):
        with Locations((-48.25, 16.25)):
            Circle(SKETCH_33_R)
    extrude(amount=-EXTRUDE_8_DEPTH)

    # 草图35 → 切除-拉伸24 (cut, through all)
    with BuildSketch(Plane(origin=(-18.75, 0, 0), x_dir=(0, 0, -1), z_dir=(1, 0, 0))):
        with Locations((36.542659939, 3.314485228)):
            Rectangle(SKETCH_35_W, SKETCH_35_H)
    extrude(amount=CUT_EXTRUDE_24_DEPTH, mode=Mode.SUBTRACT)

    # 草图36 → 切除-拉伸25 (cut)
    with BuildSketch(Plane.XZ.offset(-4)):
        with Locations((-28.75, -12.25)):
            Rectangle(SKETCH_36_W, SKETCH_36_H)
    extrude(amount=-CUT_EXTRUDE_25_DEPTH, mode=Mode.SUBTRACT)

    # 草图37 → 切除-拉伸26 (cut)
    with BuildSketch(Plane.XZ.offset(-7)):
        with BuildLine():
            ThreePointArc((-25.5, -12.25), (-23.75, -14), (-22, -12.25))
            Line((-22, -12.25), (-25.5, -12.25))
        make_face()
        with BuildLine():
            Line((-25.5, -12.25), (-22, -12.25))
            ThreePointArc((-22, -12.25), (-23.75, -10.5), (-25.5, -12.25))
        make_face()
        with Locations(Location((-33.75, -12.25, 0), (0, 0, 270))):
            Circle(SKETCH_37_R)
    extrude(amount=-CUT_EXTRUDE_26_DEPTH, mode=Mode.SUBTRACT)

    # 圆角1
    fillet_1_edges = [part.edges().sort_by_distance(p)[0] for p in [
        (-39.75, 7.5, -27.75),
        (-26.75, 7.5, -27.75),
        (-45.75, 5, -27.75),
        (-20.75, 5, -27.75),
        (-18.75, 5.5, -22.25),
        (-38.75, 5.5, -22.25),
    ]]
    fillet(fillet_1_edges, radius=FILLET_1_R)


solid = part.part
